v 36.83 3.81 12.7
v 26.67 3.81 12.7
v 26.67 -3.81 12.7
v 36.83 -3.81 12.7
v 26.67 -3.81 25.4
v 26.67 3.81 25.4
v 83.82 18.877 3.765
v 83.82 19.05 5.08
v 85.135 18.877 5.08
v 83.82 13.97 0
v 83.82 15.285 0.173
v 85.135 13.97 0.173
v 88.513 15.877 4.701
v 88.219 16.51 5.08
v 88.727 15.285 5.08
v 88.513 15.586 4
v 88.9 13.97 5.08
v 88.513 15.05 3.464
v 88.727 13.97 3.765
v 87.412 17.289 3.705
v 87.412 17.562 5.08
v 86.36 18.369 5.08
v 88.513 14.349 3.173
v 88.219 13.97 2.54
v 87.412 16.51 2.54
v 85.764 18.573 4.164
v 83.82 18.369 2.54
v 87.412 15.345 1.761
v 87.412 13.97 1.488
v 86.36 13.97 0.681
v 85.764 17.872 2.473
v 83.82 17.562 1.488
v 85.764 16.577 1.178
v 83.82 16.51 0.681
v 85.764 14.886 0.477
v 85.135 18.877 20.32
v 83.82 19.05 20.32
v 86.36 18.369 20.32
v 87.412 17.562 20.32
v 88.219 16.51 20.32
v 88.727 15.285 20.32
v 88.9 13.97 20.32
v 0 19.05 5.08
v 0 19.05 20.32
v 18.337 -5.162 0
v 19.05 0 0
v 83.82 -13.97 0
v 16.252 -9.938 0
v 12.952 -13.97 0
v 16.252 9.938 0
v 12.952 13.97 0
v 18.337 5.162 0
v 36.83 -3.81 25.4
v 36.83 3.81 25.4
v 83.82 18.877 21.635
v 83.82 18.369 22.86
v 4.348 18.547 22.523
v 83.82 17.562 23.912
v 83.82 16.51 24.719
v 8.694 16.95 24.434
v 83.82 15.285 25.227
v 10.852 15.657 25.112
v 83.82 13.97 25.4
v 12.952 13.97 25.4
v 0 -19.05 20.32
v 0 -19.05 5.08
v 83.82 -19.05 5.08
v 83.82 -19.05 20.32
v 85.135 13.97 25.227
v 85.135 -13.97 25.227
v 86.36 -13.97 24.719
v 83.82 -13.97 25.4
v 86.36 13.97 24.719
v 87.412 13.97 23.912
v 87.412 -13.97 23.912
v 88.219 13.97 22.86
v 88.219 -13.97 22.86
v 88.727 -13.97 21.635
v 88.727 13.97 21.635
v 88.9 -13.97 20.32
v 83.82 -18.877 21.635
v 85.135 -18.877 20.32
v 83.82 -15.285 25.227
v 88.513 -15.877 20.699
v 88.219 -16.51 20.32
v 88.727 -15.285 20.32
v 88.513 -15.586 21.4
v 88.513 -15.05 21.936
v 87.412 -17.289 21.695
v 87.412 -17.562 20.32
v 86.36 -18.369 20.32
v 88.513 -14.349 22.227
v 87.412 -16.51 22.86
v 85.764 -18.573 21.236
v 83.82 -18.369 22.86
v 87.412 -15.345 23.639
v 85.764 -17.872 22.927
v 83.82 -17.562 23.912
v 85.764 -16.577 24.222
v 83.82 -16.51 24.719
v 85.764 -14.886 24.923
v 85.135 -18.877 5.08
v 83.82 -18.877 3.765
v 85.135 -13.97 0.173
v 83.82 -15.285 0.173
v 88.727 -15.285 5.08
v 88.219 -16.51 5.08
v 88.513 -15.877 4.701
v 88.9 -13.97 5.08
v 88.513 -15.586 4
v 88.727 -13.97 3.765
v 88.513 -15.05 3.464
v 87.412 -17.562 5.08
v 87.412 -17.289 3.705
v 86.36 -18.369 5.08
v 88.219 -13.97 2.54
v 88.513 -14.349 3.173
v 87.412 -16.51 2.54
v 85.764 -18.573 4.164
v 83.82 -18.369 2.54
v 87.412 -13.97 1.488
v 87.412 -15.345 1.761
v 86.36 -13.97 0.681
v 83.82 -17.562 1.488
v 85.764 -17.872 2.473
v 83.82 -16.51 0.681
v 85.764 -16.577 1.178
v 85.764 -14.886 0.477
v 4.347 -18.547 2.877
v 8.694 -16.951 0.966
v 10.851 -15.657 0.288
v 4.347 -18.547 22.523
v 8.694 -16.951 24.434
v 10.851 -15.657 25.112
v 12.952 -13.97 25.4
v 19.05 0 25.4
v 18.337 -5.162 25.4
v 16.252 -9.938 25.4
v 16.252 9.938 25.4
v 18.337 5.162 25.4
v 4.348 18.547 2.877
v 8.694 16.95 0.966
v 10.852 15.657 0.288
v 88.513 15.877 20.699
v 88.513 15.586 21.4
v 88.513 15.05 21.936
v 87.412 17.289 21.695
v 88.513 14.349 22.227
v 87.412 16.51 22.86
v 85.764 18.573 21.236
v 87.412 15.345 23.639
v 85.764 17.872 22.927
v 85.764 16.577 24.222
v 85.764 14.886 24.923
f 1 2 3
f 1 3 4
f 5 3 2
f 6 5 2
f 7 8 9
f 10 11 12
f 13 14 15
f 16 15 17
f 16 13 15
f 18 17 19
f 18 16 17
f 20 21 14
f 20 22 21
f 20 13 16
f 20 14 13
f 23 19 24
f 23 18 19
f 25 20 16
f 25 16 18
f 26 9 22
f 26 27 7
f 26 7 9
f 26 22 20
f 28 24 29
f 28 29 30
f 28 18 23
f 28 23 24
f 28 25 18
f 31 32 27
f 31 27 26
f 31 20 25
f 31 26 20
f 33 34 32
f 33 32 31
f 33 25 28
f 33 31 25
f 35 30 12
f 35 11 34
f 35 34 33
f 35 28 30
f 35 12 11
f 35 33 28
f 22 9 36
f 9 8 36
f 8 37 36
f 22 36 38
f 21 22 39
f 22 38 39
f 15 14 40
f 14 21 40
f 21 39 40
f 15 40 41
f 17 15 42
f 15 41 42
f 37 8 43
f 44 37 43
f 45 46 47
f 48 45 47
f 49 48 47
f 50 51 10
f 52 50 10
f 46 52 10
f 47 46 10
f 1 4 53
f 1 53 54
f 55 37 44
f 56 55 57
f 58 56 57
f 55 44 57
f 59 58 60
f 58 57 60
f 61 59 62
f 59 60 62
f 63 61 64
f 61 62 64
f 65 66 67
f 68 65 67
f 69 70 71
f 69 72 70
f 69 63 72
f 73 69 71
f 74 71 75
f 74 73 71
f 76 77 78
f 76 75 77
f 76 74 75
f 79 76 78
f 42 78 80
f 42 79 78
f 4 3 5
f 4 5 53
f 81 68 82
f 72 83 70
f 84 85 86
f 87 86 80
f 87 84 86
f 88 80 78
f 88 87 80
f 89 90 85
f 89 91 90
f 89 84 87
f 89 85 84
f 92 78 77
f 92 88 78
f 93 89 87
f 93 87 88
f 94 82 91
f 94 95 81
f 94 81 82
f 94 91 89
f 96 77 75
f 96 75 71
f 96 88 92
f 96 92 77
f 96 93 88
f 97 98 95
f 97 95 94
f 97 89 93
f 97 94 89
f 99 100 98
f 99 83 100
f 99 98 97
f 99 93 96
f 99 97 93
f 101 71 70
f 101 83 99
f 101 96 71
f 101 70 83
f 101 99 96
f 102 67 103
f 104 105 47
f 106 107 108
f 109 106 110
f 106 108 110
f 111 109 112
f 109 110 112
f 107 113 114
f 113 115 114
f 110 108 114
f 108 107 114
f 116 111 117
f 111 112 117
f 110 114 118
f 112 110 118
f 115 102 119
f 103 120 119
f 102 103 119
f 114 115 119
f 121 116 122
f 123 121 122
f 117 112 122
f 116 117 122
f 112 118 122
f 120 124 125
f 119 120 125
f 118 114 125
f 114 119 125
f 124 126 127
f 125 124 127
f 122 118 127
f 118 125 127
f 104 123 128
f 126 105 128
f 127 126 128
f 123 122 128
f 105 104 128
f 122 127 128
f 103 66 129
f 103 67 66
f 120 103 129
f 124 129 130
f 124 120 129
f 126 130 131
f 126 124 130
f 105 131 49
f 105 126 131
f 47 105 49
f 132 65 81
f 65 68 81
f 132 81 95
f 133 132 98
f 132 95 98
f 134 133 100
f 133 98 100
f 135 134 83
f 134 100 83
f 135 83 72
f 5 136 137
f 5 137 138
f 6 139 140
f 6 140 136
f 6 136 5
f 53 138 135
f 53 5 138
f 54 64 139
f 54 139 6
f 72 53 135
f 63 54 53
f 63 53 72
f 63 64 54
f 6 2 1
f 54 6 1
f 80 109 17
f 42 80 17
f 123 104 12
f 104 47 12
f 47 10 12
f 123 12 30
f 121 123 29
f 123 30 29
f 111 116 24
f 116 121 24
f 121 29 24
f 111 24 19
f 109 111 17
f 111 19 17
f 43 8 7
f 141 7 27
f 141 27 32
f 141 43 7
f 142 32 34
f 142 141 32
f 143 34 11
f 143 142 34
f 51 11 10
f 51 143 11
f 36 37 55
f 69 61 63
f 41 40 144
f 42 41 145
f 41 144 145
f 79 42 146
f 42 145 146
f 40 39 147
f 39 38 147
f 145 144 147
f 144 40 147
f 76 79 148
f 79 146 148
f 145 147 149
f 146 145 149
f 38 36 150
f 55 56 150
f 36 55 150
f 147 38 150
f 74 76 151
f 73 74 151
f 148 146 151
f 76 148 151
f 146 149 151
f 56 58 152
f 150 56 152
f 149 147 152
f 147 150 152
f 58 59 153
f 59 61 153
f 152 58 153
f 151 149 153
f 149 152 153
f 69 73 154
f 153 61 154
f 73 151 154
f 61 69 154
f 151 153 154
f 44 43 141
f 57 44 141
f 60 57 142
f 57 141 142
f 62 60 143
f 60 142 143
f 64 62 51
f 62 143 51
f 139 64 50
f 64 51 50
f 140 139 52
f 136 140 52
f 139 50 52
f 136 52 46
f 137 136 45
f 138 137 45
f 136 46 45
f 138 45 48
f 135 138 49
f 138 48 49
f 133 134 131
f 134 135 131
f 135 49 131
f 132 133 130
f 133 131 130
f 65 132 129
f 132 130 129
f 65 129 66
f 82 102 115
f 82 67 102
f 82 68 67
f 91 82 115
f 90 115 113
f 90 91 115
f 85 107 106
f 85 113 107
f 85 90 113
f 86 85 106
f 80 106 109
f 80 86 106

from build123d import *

# Parameters (mm, degrees)
F1_DEPTH = 25.4
F2_W     = 10.16
F2_H     = 7.62
F3_DEPTH = 12.7
F4_R     = 5.08


with BuildPart() as f1:
    # F0 (on Top) → F1 (new body)
    with BuildSketch(Plane.XY):
        with BuildLine():
            ThreePointArc((0, 19.05), (19.05, 0), (0, -19.05))
            Line((0, -19.05), (88.9, -19.05))
            Line((88.9, -19.05), (88.9, 19.05))
            Line((88.9, 19.05), (0, 19.05))
        make_face()
    extrude(amount=F1_DEPTH)

    # F2 (on face) → F3 (cut)
    with BuildSketch(Plane.XY.offset(25.4)):
        with Locations((31.75, 0)):
            Rectangle(F2_W, F2_H)
    extrude(amount=-F3_DEPTH, mode=Mode.SUBTRACT)

    # F4
    f4_edges = [f1.edges().sort_by_distance(p)[0] for p in [
        (44.45, -19.05, 25.4),
        (44.45, 19.05, 25.4),
        (44.45, 19.05, 0),
        (44.45, -19.05, 0),
        (88.9, -19.05, 12.7),
        (88.9, 19.05, 12.7),
        (88.9, 0, 0),
        (88.9, 0, 25.4),
    ]]
    fillet(f4_edges, radius=F4_R)


solid = f1.part
